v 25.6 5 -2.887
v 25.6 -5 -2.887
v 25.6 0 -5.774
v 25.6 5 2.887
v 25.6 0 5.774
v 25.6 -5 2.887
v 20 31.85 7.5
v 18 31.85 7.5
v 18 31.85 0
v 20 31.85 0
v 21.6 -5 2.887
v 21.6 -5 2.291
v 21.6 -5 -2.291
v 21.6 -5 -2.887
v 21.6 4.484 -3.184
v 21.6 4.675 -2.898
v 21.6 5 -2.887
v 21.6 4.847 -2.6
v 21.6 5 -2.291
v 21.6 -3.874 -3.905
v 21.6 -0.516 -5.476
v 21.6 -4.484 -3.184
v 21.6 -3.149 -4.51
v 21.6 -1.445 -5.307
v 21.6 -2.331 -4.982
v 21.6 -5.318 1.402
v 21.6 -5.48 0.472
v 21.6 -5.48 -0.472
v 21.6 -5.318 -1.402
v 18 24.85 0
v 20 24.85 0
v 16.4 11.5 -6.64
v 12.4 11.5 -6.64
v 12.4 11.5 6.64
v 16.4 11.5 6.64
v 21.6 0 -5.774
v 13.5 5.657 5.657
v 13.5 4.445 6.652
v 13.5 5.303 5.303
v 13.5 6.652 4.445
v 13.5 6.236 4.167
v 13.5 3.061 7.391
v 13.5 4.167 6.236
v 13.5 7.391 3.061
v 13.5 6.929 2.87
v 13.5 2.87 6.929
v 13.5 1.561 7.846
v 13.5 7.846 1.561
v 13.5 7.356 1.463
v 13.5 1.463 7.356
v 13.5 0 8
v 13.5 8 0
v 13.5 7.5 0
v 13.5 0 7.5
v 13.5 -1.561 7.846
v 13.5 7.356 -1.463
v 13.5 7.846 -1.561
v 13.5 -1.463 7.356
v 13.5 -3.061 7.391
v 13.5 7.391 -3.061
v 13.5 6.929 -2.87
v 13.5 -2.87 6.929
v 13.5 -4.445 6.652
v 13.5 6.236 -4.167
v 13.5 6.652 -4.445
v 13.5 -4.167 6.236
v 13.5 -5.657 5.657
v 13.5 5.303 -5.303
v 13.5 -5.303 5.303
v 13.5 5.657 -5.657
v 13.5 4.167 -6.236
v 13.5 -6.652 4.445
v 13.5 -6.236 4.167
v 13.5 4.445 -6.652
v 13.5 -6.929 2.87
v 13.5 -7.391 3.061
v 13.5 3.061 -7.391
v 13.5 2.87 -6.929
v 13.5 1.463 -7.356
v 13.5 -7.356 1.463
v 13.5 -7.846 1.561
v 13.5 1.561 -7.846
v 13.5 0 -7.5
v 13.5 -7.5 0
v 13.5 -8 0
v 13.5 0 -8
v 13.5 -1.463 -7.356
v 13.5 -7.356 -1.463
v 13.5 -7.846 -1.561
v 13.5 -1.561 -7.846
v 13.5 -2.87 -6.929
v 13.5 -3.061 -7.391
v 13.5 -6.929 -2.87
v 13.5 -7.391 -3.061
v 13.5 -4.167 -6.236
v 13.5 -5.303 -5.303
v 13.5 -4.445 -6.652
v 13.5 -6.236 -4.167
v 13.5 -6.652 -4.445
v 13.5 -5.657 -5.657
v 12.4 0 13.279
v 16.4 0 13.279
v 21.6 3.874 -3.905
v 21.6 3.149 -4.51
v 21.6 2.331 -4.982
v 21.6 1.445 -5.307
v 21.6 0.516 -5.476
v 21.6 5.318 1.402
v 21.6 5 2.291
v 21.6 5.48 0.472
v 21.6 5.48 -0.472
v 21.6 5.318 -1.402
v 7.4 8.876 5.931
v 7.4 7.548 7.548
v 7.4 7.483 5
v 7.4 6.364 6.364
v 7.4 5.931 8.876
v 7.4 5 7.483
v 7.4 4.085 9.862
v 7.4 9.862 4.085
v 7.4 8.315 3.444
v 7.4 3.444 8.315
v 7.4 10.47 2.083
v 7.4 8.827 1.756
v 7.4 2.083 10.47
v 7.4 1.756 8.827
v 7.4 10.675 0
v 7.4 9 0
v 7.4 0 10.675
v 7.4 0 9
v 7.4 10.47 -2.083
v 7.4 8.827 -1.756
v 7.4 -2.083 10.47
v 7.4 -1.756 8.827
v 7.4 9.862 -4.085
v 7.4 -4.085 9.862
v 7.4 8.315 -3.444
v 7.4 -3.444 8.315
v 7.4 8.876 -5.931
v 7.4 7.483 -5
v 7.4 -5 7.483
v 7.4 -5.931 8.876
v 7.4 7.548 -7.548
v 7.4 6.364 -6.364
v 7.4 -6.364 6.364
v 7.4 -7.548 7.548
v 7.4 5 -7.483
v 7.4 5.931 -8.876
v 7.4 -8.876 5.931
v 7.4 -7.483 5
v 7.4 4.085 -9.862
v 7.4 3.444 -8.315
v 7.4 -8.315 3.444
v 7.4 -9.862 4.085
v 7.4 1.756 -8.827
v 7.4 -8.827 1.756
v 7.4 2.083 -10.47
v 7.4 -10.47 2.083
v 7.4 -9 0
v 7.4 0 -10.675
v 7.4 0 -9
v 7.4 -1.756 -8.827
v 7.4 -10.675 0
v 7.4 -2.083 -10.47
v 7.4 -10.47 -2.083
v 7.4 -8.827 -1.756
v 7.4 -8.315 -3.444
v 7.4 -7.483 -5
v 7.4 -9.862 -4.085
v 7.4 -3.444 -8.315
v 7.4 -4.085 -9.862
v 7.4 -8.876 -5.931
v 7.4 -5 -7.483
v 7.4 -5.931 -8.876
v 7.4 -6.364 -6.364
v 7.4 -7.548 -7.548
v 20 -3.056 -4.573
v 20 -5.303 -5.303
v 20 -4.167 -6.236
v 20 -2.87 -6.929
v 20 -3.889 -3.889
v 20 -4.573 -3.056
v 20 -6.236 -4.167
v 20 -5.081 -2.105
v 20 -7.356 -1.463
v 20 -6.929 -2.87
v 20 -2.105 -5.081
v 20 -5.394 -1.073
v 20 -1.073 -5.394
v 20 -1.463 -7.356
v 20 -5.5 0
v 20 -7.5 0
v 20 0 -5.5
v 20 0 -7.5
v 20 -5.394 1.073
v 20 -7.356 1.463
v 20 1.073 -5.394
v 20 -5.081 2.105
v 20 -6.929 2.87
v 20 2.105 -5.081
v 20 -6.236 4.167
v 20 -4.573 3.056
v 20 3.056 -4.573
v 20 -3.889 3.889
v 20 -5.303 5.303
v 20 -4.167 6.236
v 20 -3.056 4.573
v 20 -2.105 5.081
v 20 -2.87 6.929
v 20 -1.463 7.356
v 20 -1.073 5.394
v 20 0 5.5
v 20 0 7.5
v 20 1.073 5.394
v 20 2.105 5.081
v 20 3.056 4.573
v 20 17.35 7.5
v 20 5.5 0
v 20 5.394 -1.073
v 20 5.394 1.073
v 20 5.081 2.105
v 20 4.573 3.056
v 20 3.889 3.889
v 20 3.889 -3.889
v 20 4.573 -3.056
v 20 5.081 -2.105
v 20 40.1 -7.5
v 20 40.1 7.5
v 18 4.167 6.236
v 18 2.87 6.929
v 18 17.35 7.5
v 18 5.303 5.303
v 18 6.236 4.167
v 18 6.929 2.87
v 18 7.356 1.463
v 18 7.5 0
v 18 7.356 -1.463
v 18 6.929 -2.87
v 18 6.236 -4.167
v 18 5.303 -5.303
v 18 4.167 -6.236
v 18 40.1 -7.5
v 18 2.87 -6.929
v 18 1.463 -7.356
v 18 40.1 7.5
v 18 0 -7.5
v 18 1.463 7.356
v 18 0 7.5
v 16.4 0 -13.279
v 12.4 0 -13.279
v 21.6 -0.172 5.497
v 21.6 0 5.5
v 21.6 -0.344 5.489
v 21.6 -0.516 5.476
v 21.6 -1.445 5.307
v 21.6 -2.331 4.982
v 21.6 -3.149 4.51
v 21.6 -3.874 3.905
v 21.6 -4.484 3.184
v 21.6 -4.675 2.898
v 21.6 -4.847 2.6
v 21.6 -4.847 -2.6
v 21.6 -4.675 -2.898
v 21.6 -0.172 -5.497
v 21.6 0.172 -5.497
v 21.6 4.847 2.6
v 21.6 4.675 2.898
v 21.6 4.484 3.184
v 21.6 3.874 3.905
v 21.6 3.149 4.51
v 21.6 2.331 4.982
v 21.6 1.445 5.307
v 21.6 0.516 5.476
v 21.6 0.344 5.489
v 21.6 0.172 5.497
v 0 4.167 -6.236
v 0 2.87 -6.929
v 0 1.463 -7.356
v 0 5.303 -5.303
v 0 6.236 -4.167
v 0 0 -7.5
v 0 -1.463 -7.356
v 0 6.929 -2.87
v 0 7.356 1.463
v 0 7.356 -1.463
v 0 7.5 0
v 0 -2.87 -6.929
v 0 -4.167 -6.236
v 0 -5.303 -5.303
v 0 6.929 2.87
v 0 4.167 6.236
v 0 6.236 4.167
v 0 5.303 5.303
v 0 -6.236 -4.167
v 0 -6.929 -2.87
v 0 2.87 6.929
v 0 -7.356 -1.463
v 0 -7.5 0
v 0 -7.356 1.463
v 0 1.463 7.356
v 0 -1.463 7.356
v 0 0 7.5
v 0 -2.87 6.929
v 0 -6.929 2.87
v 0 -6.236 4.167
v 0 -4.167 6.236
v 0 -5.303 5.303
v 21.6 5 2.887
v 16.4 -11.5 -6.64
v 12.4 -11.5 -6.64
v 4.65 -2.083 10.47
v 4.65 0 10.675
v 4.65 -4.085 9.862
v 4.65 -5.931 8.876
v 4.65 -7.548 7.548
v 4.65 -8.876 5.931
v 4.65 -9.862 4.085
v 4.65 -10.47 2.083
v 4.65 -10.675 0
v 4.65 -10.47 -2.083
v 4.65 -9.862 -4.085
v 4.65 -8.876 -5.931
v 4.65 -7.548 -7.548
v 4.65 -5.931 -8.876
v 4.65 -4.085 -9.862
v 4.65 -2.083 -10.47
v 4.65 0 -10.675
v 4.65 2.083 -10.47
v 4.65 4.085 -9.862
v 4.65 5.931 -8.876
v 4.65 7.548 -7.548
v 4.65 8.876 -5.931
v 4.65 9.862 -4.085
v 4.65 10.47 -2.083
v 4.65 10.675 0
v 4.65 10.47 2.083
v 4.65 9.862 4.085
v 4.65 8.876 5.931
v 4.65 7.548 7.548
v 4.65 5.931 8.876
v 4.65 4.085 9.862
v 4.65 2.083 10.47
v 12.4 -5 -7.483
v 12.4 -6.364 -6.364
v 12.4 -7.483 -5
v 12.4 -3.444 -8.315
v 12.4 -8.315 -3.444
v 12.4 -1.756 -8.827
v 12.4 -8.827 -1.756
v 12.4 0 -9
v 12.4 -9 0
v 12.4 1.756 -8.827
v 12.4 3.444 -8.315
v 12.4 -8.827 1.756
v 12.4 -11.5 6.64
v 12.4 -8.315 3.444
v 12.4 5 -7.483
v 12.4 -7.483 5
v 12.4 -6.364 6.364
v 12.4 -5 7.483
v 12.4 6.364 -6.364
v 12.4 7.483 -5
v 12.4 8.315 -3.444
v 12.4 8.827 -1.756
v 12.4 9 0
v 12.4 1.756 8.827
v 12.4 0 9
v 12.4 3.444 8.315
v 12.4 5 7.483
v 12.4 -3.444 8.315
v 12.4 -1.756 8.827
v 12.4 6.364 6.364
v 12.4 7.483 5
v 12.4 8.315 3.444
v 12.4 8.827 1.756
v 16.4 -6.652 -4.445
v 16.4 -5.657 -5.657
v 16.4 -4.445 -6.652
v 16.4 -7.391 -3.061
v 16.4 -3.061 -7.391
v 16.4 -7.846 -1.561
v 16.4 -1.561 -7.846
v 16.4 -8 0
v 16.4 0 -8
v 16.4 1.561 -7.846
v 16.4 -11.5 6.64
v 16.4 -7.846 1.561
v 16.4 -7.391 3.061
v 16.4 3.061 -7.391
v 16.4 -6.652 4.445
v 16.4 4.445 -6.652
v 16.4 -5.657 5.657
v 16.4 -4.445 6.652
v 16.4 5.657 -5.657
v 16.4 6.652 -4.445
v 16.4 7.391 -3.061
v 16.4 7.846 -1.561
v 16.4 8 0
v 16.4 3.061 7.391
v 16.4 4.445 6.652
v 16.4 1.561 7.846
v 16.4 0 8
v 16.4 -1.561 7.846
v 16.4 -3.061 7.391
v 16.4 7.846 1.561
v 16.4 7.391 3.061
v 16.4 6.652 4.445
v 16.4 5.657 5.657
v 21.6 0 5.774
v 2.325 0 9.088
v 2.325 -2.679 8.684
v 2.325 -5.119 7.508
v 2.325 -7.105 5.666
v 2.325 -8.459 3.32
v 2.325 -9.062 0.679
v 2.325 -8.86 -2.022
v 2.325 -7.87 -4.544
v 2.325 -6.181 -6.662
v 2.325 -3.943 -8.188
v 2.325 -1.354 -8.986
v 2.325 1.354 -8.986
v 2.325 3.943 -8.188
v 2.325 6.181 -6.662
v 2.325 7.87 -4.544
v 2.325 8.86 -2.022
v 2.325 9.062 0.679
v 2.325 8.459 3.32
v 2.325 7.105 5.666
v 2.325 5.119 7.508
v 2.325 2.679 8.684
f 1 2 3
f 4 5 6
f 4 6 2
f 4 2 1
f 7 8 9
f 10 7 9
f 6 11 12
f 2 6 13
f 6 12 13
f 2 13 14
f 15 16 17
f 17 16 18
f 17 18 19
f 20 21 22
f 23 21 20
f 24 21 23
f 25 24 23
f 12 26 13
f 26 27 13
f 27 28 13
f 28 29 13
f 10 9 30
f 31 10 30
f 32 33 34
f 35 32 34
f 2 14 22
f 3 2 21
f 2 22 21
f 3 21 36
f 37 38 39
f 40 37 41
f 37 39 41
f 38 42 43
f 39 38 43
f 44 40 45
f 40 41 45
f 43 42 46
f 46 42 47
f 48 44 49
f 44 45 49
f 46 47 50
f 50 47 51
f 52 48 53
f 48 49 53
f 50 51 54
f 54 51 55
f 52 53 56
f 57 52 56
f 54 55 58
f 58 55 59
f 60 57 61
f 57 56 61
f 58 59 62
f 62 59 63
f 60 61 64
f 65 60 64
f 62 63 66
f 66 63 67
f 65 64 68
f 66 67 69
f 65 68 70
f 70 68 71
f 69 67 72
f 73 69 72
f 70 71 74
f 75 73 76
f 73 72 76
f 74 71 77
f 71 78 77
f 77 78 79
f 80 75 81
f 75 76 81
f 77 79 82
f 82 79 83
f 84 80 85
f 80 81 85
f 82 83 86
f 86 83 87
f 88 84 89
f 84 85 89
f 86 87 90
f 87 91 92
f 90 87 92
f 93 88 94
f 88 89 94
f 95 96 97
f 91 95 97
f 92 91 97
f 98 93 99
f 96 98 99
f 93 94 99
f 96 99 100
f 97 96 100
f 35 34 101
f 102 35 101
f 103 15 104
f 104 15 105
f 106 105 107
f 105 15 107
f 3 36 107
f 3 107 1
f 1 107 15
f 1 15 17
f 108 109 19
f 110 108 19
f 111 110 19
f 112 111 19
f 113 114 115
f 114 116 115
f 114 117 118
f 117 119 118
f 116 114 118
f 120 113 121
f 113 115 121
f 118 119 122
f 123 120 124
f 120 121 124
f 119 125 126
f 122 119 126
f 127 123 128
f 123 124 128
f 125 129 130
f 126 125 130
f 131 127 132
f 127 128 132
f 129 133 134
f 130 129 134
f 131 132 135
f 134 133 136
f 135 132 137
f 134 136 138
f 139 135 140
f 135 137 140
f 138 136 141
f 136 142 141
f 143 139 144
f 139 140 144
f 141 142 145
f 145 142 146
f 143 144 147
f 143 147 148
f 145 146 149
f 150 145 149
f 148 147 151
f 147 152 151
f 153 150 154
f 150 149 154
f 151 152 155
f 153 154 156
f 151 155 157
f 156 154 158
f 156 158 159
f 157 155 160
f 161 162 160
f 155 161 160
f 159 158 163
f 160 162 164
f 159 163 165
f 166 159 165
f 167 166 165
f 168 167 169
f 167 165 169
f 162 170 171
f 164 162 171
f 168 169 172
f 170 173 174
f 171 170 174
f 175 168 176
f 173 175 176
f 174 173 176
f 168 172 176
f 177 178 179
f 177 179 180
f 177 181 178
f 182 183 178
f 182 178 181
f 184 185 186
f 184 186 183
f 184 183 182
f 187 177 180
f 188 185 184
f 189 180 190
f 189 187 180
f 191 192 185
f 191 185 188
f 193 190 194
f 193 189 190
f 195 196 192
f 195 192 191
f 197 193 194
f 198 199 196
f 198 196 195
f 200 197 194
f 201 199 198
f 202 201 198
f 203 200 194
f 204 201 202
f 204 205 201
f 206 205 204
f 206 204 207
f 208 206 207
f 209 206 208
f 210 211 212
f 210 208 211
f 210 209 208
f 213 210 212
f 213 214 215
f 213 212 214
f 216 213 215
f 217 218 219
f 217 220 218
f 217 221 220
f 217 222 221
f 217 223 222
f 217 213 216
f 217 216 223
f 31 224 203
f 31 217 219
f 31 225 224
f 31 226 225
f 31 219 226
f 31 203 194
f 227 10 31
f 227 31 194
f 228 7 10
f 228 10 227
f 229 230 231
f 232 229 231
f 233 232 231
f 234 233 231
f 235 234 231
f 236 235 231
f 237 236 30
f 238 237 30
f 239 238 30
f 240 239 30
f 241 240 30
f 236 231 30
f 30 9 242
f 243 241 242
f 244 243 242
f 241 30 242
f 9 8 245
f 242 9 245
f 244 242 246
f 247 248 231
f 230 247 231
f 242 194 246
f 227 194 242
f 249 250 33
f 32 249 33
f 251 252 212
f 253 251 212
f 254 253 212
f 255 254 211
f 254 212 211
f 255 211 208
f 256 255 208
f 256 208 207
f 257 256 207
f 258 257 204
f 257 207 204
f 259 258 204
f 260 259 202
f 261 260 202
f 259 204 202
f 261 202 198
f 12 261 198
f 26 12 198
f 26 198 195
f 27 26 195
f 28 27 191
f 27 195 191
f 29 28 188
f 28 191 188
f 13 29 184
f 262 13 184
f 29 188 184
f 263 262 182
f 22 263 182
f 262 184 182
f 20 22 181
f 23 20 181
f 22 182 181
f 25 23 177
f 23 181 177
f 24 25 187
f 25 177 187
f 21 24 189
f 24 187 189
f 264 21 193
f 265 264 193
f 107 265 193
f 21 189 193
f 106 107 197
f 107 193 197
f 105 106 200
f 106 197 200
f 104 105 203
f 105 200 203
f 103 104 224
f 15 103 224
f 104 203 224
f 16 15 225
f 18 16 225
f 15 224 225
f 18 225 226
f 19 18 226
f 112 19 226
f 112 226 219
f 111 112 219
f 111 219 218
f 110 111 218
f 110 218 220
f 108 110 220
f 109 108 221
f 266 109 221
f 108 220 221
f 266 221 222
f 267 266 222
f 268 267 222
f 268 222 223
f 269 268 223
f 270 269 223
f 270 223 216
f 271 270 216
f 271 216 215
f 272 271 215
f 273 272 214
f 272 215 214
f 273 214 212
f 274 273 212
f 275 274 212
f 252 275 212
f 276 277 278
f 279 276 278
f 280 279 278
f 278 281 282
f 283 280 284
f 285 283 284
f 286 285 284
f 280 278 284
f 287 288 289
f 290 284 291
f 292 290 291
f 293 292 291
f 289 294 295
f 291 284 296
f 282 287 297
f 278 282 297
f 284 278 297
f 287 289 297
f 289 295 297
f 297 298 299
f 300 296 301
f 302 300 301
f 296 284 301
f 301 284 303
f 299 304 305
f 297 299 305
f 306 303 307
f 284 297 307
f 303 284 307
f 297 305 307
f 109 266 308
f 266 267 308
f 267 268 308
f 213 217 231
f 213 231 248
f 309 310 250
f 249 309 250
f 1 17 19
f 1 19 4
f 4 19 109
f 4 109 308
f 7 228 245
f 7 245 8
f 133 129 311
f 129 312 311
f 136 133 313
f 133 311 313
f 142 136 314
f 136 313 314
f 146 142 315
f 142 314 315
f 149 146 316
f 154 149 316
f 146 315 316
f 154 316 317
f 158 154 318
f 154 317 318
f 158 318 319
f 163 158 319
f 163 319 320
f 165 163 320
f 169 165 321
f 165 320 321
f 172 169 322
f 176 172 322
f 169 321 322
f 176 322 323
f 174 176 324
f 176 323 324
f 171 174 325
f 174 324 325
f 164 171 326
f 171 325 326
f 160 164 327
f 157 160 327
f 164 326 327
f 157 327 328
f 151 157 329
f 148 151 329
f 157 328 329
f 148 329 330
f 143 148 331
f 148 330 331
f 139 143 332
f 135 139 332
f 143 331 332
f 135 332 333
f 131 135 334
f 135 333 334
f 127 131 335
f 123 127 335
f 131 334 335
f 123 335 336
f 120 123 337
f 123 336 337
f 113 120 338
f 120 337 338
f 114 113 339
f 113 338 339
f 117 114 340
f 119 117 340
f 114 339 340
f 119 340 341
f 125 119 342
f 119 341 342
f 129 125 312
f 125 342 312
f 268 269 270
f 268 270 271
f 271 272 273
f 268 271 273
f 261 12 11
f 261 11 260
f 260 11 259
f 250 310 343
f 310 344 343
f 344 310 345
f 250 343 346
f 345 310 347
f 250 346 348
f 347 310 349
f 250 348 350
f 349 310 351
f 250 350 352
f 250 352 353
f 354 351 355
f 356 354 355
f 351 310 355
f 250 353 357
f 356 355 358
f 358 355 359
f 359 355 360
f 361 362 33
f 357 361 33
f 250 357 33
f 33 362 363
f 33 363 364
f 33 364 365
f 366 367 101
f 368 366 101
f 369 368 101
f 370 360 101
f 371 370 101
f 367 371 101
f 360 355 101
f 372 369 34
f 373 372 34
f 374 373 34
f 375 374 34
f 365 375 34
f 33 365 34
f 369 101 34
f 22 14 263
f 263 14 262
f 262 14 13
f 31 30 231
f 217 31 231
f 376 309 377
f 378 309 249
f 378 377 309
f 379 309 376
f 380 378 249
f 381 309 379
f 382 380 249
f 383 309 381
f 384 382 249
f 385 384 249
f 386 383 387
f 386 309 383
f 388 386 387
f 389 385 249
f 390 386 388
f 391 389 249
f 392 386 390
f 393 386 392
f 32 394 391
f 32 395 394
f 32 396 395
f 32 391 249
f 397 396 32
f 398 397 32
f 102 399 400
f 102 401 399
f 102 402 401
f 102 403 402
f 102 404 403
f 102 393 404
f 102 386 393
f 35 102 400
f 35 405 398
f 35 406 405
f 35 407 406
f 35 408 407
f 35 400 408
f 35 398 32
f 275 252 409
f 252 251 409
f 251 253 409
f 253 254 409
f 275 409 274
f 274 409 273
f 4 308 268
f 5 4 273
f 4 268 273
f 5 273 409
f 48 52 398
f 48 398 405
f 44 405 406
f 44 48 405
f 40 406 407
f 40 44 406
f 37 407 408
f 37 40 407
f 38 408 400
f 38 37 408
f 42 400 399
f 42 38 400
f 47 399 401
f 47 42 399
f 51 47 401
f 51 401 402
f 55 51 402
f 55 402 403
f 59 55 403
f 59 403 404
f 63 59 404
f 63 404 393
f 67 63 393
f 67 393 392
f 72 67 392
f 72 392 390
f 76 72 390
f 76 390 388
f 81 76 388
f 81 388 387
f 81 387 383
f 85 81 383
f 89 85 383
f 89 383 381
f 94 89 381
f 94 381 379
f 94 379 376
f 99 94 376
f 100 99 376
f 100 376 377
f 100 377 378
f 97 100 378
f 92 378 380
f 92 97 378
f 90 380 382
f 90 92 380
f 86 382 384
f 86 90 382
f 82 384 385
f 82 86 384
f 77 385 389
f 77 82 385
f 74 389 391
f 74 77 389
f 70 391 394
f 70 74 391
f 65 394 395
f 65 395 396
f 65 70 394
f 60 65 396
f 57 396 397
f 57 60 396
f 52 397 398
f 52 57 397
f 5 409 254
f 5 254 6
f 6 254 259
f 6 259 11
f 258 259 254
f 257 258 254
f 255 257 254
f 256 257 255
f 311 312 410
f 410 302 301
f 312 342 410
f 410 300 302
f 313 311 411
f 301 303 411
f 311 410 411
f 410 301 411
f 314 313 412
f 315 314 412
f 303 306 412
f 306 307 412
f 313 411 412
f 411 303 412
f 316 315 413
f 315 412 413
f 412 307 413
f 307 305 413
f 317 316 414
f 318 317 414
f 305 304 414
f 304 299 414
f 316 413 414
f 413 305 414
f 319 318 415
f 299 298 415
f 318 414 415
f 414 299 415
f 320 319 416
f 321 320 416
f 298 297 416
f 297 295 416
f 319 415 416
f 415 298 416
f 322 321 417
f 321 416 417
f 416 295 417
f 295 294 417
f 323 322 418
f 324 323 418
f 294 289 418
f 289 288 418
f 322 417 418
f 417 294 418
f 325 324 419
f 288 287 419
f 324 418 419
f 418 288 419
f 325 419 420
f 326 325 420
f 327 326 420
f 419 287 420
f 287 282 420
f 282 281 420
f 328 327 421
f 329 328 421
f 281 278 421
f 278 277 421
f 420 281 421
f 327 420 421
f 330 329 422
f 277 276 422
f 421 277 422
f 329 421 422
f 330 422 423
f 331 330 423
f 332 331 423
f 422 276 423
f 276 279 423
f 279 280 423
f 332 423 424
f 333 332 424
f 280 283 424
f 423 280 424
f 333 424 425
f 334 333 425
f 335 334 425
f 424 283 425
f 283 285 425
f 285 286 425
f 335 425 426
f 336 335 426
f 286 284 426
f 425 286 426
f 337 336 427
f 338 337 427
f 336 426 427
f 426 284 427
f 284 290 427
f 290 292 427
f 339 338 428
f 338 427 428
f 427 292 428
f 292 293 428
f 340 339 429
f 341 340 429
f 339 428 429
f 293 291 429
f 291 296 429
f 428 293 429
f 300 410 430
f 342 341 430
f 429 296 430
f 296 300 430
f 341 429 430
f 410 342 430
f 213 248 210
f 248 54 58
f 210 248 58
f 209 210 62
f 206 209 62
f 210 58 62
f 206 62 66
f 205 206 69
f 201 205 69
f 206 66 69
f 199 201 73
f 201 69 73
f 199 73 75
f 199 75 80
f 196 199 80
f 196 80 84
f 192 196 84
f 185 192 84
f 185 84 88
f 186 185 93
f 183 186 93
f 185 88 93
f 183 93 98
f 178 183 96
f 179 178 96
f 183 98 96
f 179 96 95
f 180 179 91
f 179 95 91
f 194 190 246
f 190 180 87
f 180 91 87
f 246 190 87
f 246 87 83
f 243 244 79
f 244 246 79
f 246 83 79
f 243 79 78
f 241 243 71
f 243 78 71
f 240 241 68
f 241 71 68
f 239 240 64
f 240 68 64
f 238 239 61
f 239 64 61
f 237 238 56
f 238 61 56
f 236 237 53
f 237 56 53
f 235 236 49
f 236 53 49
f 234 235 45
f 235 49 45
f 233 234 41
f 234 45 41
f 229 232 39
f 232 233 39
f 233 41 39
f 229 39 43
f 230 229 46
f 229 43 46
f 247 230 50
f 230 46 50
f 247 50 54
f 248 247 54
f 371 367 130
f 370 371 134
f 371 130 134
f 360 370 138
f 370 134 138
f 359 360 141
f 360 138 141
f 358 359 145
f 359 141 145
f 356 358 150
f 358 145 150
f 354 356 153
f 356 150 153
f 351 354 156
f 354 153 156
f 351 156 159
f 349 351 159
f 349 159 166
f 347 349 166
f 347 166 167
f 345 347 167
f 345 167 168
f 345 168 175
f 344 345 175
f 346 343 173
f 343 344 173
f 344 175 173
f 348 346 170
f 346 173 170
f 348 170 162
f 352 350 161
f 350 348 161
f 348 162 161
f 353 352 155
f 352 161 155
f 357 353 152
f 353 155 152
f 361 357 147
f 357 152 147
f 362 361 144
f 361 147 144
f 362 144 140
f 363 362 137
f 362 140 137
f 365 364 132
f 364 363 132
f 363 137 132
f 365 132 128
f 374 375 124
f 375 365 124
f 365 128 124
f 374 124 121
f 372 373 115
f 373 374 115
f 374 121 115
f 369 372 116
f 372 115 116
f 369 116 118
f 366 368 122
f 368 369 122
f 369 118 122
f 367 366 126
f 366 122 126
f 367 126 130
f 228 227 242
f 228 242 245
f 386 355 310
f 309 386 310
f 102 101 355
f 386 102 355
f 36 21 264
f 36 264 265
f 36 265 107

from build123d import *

# Parameters (mm, degrees)
F4_R      = 8
F5_DEPTH  = 4
F7_DEPTH  = 2
F9_DEPTH  = 4
F11_DEPTH = 25


with BuildPart() as f1:
    # F0 (on Front) → F1 (revolve)
    with BuildSketch(Plane.XZ):
        Polygon((0, 7.5), (0, 0), (21.6, 0), (21.6, 5.5), (20, 5.5), (20, 7.5), (13.5, 7.5), (13.5, 9), (7.4, 9), (7.4, 10.675), (4.65, 10.675), align=None)
    revolve(axis=Axis((10.8, 0, 0), (1, 0, 0)))

    # F4 (on offset) → F5 (join)
    with BuildSketch(Plane.YZ.offset(12.4)):
        Polygon((11.5, 6.6395280957), (0, 13.2790561914), (-11.5, 6.6395280957), (-11.5, -6.6395280957), (0, -13.2790561914), (11.5, -6.6395280957), align=None)
        Circle(F4_R, mode=Mode.SUBTRACT)
    extrude(amount=F5_DEPTH)

    # F6 (on face) → F7 (join)
    with BuildSketch(Plane.YZ.offset(20)):
        with BuildLine():
            Line((40.1, 7.5), (0, 7.5))
            ThreePointArc((0, 7.5), (-7.5, 0), (0, -7.5))
            Line((0, -7.5), (40.1, -7.5))
            Line((40.1, -7.5), (40.1, 7.5))
        make_face()
    extrude(amount=-F7_DEPTH)

    # F8 (on face) → F9 (join)
    with BuildSketch(Plane.YZ.offset(21.6)):
        Polygon((5, -2.8867513459), (5, 2.8867513459), (0, 5.7735026919), (-5, 2.8867513459), (-5, -2.8867513459), (0, -5.7735026919), align=None)
    extrude(amount=F9_DEPTH)

    # F10 (on face) → F11 (cut)
    with BuildSketch(Plane(origin=(18, 0, 0), x_dir=(0, -1, 0), z_dir=(-1, 0, 0))):
        Polygon((-17.35, 7.5), (-31.85, 7.5), (-31.85, 0), (-24.85, 0), align=None)
    extrude(amount=-F11_DEPTH, mode=Mode.SUBTRACT)


solid = f1.part
